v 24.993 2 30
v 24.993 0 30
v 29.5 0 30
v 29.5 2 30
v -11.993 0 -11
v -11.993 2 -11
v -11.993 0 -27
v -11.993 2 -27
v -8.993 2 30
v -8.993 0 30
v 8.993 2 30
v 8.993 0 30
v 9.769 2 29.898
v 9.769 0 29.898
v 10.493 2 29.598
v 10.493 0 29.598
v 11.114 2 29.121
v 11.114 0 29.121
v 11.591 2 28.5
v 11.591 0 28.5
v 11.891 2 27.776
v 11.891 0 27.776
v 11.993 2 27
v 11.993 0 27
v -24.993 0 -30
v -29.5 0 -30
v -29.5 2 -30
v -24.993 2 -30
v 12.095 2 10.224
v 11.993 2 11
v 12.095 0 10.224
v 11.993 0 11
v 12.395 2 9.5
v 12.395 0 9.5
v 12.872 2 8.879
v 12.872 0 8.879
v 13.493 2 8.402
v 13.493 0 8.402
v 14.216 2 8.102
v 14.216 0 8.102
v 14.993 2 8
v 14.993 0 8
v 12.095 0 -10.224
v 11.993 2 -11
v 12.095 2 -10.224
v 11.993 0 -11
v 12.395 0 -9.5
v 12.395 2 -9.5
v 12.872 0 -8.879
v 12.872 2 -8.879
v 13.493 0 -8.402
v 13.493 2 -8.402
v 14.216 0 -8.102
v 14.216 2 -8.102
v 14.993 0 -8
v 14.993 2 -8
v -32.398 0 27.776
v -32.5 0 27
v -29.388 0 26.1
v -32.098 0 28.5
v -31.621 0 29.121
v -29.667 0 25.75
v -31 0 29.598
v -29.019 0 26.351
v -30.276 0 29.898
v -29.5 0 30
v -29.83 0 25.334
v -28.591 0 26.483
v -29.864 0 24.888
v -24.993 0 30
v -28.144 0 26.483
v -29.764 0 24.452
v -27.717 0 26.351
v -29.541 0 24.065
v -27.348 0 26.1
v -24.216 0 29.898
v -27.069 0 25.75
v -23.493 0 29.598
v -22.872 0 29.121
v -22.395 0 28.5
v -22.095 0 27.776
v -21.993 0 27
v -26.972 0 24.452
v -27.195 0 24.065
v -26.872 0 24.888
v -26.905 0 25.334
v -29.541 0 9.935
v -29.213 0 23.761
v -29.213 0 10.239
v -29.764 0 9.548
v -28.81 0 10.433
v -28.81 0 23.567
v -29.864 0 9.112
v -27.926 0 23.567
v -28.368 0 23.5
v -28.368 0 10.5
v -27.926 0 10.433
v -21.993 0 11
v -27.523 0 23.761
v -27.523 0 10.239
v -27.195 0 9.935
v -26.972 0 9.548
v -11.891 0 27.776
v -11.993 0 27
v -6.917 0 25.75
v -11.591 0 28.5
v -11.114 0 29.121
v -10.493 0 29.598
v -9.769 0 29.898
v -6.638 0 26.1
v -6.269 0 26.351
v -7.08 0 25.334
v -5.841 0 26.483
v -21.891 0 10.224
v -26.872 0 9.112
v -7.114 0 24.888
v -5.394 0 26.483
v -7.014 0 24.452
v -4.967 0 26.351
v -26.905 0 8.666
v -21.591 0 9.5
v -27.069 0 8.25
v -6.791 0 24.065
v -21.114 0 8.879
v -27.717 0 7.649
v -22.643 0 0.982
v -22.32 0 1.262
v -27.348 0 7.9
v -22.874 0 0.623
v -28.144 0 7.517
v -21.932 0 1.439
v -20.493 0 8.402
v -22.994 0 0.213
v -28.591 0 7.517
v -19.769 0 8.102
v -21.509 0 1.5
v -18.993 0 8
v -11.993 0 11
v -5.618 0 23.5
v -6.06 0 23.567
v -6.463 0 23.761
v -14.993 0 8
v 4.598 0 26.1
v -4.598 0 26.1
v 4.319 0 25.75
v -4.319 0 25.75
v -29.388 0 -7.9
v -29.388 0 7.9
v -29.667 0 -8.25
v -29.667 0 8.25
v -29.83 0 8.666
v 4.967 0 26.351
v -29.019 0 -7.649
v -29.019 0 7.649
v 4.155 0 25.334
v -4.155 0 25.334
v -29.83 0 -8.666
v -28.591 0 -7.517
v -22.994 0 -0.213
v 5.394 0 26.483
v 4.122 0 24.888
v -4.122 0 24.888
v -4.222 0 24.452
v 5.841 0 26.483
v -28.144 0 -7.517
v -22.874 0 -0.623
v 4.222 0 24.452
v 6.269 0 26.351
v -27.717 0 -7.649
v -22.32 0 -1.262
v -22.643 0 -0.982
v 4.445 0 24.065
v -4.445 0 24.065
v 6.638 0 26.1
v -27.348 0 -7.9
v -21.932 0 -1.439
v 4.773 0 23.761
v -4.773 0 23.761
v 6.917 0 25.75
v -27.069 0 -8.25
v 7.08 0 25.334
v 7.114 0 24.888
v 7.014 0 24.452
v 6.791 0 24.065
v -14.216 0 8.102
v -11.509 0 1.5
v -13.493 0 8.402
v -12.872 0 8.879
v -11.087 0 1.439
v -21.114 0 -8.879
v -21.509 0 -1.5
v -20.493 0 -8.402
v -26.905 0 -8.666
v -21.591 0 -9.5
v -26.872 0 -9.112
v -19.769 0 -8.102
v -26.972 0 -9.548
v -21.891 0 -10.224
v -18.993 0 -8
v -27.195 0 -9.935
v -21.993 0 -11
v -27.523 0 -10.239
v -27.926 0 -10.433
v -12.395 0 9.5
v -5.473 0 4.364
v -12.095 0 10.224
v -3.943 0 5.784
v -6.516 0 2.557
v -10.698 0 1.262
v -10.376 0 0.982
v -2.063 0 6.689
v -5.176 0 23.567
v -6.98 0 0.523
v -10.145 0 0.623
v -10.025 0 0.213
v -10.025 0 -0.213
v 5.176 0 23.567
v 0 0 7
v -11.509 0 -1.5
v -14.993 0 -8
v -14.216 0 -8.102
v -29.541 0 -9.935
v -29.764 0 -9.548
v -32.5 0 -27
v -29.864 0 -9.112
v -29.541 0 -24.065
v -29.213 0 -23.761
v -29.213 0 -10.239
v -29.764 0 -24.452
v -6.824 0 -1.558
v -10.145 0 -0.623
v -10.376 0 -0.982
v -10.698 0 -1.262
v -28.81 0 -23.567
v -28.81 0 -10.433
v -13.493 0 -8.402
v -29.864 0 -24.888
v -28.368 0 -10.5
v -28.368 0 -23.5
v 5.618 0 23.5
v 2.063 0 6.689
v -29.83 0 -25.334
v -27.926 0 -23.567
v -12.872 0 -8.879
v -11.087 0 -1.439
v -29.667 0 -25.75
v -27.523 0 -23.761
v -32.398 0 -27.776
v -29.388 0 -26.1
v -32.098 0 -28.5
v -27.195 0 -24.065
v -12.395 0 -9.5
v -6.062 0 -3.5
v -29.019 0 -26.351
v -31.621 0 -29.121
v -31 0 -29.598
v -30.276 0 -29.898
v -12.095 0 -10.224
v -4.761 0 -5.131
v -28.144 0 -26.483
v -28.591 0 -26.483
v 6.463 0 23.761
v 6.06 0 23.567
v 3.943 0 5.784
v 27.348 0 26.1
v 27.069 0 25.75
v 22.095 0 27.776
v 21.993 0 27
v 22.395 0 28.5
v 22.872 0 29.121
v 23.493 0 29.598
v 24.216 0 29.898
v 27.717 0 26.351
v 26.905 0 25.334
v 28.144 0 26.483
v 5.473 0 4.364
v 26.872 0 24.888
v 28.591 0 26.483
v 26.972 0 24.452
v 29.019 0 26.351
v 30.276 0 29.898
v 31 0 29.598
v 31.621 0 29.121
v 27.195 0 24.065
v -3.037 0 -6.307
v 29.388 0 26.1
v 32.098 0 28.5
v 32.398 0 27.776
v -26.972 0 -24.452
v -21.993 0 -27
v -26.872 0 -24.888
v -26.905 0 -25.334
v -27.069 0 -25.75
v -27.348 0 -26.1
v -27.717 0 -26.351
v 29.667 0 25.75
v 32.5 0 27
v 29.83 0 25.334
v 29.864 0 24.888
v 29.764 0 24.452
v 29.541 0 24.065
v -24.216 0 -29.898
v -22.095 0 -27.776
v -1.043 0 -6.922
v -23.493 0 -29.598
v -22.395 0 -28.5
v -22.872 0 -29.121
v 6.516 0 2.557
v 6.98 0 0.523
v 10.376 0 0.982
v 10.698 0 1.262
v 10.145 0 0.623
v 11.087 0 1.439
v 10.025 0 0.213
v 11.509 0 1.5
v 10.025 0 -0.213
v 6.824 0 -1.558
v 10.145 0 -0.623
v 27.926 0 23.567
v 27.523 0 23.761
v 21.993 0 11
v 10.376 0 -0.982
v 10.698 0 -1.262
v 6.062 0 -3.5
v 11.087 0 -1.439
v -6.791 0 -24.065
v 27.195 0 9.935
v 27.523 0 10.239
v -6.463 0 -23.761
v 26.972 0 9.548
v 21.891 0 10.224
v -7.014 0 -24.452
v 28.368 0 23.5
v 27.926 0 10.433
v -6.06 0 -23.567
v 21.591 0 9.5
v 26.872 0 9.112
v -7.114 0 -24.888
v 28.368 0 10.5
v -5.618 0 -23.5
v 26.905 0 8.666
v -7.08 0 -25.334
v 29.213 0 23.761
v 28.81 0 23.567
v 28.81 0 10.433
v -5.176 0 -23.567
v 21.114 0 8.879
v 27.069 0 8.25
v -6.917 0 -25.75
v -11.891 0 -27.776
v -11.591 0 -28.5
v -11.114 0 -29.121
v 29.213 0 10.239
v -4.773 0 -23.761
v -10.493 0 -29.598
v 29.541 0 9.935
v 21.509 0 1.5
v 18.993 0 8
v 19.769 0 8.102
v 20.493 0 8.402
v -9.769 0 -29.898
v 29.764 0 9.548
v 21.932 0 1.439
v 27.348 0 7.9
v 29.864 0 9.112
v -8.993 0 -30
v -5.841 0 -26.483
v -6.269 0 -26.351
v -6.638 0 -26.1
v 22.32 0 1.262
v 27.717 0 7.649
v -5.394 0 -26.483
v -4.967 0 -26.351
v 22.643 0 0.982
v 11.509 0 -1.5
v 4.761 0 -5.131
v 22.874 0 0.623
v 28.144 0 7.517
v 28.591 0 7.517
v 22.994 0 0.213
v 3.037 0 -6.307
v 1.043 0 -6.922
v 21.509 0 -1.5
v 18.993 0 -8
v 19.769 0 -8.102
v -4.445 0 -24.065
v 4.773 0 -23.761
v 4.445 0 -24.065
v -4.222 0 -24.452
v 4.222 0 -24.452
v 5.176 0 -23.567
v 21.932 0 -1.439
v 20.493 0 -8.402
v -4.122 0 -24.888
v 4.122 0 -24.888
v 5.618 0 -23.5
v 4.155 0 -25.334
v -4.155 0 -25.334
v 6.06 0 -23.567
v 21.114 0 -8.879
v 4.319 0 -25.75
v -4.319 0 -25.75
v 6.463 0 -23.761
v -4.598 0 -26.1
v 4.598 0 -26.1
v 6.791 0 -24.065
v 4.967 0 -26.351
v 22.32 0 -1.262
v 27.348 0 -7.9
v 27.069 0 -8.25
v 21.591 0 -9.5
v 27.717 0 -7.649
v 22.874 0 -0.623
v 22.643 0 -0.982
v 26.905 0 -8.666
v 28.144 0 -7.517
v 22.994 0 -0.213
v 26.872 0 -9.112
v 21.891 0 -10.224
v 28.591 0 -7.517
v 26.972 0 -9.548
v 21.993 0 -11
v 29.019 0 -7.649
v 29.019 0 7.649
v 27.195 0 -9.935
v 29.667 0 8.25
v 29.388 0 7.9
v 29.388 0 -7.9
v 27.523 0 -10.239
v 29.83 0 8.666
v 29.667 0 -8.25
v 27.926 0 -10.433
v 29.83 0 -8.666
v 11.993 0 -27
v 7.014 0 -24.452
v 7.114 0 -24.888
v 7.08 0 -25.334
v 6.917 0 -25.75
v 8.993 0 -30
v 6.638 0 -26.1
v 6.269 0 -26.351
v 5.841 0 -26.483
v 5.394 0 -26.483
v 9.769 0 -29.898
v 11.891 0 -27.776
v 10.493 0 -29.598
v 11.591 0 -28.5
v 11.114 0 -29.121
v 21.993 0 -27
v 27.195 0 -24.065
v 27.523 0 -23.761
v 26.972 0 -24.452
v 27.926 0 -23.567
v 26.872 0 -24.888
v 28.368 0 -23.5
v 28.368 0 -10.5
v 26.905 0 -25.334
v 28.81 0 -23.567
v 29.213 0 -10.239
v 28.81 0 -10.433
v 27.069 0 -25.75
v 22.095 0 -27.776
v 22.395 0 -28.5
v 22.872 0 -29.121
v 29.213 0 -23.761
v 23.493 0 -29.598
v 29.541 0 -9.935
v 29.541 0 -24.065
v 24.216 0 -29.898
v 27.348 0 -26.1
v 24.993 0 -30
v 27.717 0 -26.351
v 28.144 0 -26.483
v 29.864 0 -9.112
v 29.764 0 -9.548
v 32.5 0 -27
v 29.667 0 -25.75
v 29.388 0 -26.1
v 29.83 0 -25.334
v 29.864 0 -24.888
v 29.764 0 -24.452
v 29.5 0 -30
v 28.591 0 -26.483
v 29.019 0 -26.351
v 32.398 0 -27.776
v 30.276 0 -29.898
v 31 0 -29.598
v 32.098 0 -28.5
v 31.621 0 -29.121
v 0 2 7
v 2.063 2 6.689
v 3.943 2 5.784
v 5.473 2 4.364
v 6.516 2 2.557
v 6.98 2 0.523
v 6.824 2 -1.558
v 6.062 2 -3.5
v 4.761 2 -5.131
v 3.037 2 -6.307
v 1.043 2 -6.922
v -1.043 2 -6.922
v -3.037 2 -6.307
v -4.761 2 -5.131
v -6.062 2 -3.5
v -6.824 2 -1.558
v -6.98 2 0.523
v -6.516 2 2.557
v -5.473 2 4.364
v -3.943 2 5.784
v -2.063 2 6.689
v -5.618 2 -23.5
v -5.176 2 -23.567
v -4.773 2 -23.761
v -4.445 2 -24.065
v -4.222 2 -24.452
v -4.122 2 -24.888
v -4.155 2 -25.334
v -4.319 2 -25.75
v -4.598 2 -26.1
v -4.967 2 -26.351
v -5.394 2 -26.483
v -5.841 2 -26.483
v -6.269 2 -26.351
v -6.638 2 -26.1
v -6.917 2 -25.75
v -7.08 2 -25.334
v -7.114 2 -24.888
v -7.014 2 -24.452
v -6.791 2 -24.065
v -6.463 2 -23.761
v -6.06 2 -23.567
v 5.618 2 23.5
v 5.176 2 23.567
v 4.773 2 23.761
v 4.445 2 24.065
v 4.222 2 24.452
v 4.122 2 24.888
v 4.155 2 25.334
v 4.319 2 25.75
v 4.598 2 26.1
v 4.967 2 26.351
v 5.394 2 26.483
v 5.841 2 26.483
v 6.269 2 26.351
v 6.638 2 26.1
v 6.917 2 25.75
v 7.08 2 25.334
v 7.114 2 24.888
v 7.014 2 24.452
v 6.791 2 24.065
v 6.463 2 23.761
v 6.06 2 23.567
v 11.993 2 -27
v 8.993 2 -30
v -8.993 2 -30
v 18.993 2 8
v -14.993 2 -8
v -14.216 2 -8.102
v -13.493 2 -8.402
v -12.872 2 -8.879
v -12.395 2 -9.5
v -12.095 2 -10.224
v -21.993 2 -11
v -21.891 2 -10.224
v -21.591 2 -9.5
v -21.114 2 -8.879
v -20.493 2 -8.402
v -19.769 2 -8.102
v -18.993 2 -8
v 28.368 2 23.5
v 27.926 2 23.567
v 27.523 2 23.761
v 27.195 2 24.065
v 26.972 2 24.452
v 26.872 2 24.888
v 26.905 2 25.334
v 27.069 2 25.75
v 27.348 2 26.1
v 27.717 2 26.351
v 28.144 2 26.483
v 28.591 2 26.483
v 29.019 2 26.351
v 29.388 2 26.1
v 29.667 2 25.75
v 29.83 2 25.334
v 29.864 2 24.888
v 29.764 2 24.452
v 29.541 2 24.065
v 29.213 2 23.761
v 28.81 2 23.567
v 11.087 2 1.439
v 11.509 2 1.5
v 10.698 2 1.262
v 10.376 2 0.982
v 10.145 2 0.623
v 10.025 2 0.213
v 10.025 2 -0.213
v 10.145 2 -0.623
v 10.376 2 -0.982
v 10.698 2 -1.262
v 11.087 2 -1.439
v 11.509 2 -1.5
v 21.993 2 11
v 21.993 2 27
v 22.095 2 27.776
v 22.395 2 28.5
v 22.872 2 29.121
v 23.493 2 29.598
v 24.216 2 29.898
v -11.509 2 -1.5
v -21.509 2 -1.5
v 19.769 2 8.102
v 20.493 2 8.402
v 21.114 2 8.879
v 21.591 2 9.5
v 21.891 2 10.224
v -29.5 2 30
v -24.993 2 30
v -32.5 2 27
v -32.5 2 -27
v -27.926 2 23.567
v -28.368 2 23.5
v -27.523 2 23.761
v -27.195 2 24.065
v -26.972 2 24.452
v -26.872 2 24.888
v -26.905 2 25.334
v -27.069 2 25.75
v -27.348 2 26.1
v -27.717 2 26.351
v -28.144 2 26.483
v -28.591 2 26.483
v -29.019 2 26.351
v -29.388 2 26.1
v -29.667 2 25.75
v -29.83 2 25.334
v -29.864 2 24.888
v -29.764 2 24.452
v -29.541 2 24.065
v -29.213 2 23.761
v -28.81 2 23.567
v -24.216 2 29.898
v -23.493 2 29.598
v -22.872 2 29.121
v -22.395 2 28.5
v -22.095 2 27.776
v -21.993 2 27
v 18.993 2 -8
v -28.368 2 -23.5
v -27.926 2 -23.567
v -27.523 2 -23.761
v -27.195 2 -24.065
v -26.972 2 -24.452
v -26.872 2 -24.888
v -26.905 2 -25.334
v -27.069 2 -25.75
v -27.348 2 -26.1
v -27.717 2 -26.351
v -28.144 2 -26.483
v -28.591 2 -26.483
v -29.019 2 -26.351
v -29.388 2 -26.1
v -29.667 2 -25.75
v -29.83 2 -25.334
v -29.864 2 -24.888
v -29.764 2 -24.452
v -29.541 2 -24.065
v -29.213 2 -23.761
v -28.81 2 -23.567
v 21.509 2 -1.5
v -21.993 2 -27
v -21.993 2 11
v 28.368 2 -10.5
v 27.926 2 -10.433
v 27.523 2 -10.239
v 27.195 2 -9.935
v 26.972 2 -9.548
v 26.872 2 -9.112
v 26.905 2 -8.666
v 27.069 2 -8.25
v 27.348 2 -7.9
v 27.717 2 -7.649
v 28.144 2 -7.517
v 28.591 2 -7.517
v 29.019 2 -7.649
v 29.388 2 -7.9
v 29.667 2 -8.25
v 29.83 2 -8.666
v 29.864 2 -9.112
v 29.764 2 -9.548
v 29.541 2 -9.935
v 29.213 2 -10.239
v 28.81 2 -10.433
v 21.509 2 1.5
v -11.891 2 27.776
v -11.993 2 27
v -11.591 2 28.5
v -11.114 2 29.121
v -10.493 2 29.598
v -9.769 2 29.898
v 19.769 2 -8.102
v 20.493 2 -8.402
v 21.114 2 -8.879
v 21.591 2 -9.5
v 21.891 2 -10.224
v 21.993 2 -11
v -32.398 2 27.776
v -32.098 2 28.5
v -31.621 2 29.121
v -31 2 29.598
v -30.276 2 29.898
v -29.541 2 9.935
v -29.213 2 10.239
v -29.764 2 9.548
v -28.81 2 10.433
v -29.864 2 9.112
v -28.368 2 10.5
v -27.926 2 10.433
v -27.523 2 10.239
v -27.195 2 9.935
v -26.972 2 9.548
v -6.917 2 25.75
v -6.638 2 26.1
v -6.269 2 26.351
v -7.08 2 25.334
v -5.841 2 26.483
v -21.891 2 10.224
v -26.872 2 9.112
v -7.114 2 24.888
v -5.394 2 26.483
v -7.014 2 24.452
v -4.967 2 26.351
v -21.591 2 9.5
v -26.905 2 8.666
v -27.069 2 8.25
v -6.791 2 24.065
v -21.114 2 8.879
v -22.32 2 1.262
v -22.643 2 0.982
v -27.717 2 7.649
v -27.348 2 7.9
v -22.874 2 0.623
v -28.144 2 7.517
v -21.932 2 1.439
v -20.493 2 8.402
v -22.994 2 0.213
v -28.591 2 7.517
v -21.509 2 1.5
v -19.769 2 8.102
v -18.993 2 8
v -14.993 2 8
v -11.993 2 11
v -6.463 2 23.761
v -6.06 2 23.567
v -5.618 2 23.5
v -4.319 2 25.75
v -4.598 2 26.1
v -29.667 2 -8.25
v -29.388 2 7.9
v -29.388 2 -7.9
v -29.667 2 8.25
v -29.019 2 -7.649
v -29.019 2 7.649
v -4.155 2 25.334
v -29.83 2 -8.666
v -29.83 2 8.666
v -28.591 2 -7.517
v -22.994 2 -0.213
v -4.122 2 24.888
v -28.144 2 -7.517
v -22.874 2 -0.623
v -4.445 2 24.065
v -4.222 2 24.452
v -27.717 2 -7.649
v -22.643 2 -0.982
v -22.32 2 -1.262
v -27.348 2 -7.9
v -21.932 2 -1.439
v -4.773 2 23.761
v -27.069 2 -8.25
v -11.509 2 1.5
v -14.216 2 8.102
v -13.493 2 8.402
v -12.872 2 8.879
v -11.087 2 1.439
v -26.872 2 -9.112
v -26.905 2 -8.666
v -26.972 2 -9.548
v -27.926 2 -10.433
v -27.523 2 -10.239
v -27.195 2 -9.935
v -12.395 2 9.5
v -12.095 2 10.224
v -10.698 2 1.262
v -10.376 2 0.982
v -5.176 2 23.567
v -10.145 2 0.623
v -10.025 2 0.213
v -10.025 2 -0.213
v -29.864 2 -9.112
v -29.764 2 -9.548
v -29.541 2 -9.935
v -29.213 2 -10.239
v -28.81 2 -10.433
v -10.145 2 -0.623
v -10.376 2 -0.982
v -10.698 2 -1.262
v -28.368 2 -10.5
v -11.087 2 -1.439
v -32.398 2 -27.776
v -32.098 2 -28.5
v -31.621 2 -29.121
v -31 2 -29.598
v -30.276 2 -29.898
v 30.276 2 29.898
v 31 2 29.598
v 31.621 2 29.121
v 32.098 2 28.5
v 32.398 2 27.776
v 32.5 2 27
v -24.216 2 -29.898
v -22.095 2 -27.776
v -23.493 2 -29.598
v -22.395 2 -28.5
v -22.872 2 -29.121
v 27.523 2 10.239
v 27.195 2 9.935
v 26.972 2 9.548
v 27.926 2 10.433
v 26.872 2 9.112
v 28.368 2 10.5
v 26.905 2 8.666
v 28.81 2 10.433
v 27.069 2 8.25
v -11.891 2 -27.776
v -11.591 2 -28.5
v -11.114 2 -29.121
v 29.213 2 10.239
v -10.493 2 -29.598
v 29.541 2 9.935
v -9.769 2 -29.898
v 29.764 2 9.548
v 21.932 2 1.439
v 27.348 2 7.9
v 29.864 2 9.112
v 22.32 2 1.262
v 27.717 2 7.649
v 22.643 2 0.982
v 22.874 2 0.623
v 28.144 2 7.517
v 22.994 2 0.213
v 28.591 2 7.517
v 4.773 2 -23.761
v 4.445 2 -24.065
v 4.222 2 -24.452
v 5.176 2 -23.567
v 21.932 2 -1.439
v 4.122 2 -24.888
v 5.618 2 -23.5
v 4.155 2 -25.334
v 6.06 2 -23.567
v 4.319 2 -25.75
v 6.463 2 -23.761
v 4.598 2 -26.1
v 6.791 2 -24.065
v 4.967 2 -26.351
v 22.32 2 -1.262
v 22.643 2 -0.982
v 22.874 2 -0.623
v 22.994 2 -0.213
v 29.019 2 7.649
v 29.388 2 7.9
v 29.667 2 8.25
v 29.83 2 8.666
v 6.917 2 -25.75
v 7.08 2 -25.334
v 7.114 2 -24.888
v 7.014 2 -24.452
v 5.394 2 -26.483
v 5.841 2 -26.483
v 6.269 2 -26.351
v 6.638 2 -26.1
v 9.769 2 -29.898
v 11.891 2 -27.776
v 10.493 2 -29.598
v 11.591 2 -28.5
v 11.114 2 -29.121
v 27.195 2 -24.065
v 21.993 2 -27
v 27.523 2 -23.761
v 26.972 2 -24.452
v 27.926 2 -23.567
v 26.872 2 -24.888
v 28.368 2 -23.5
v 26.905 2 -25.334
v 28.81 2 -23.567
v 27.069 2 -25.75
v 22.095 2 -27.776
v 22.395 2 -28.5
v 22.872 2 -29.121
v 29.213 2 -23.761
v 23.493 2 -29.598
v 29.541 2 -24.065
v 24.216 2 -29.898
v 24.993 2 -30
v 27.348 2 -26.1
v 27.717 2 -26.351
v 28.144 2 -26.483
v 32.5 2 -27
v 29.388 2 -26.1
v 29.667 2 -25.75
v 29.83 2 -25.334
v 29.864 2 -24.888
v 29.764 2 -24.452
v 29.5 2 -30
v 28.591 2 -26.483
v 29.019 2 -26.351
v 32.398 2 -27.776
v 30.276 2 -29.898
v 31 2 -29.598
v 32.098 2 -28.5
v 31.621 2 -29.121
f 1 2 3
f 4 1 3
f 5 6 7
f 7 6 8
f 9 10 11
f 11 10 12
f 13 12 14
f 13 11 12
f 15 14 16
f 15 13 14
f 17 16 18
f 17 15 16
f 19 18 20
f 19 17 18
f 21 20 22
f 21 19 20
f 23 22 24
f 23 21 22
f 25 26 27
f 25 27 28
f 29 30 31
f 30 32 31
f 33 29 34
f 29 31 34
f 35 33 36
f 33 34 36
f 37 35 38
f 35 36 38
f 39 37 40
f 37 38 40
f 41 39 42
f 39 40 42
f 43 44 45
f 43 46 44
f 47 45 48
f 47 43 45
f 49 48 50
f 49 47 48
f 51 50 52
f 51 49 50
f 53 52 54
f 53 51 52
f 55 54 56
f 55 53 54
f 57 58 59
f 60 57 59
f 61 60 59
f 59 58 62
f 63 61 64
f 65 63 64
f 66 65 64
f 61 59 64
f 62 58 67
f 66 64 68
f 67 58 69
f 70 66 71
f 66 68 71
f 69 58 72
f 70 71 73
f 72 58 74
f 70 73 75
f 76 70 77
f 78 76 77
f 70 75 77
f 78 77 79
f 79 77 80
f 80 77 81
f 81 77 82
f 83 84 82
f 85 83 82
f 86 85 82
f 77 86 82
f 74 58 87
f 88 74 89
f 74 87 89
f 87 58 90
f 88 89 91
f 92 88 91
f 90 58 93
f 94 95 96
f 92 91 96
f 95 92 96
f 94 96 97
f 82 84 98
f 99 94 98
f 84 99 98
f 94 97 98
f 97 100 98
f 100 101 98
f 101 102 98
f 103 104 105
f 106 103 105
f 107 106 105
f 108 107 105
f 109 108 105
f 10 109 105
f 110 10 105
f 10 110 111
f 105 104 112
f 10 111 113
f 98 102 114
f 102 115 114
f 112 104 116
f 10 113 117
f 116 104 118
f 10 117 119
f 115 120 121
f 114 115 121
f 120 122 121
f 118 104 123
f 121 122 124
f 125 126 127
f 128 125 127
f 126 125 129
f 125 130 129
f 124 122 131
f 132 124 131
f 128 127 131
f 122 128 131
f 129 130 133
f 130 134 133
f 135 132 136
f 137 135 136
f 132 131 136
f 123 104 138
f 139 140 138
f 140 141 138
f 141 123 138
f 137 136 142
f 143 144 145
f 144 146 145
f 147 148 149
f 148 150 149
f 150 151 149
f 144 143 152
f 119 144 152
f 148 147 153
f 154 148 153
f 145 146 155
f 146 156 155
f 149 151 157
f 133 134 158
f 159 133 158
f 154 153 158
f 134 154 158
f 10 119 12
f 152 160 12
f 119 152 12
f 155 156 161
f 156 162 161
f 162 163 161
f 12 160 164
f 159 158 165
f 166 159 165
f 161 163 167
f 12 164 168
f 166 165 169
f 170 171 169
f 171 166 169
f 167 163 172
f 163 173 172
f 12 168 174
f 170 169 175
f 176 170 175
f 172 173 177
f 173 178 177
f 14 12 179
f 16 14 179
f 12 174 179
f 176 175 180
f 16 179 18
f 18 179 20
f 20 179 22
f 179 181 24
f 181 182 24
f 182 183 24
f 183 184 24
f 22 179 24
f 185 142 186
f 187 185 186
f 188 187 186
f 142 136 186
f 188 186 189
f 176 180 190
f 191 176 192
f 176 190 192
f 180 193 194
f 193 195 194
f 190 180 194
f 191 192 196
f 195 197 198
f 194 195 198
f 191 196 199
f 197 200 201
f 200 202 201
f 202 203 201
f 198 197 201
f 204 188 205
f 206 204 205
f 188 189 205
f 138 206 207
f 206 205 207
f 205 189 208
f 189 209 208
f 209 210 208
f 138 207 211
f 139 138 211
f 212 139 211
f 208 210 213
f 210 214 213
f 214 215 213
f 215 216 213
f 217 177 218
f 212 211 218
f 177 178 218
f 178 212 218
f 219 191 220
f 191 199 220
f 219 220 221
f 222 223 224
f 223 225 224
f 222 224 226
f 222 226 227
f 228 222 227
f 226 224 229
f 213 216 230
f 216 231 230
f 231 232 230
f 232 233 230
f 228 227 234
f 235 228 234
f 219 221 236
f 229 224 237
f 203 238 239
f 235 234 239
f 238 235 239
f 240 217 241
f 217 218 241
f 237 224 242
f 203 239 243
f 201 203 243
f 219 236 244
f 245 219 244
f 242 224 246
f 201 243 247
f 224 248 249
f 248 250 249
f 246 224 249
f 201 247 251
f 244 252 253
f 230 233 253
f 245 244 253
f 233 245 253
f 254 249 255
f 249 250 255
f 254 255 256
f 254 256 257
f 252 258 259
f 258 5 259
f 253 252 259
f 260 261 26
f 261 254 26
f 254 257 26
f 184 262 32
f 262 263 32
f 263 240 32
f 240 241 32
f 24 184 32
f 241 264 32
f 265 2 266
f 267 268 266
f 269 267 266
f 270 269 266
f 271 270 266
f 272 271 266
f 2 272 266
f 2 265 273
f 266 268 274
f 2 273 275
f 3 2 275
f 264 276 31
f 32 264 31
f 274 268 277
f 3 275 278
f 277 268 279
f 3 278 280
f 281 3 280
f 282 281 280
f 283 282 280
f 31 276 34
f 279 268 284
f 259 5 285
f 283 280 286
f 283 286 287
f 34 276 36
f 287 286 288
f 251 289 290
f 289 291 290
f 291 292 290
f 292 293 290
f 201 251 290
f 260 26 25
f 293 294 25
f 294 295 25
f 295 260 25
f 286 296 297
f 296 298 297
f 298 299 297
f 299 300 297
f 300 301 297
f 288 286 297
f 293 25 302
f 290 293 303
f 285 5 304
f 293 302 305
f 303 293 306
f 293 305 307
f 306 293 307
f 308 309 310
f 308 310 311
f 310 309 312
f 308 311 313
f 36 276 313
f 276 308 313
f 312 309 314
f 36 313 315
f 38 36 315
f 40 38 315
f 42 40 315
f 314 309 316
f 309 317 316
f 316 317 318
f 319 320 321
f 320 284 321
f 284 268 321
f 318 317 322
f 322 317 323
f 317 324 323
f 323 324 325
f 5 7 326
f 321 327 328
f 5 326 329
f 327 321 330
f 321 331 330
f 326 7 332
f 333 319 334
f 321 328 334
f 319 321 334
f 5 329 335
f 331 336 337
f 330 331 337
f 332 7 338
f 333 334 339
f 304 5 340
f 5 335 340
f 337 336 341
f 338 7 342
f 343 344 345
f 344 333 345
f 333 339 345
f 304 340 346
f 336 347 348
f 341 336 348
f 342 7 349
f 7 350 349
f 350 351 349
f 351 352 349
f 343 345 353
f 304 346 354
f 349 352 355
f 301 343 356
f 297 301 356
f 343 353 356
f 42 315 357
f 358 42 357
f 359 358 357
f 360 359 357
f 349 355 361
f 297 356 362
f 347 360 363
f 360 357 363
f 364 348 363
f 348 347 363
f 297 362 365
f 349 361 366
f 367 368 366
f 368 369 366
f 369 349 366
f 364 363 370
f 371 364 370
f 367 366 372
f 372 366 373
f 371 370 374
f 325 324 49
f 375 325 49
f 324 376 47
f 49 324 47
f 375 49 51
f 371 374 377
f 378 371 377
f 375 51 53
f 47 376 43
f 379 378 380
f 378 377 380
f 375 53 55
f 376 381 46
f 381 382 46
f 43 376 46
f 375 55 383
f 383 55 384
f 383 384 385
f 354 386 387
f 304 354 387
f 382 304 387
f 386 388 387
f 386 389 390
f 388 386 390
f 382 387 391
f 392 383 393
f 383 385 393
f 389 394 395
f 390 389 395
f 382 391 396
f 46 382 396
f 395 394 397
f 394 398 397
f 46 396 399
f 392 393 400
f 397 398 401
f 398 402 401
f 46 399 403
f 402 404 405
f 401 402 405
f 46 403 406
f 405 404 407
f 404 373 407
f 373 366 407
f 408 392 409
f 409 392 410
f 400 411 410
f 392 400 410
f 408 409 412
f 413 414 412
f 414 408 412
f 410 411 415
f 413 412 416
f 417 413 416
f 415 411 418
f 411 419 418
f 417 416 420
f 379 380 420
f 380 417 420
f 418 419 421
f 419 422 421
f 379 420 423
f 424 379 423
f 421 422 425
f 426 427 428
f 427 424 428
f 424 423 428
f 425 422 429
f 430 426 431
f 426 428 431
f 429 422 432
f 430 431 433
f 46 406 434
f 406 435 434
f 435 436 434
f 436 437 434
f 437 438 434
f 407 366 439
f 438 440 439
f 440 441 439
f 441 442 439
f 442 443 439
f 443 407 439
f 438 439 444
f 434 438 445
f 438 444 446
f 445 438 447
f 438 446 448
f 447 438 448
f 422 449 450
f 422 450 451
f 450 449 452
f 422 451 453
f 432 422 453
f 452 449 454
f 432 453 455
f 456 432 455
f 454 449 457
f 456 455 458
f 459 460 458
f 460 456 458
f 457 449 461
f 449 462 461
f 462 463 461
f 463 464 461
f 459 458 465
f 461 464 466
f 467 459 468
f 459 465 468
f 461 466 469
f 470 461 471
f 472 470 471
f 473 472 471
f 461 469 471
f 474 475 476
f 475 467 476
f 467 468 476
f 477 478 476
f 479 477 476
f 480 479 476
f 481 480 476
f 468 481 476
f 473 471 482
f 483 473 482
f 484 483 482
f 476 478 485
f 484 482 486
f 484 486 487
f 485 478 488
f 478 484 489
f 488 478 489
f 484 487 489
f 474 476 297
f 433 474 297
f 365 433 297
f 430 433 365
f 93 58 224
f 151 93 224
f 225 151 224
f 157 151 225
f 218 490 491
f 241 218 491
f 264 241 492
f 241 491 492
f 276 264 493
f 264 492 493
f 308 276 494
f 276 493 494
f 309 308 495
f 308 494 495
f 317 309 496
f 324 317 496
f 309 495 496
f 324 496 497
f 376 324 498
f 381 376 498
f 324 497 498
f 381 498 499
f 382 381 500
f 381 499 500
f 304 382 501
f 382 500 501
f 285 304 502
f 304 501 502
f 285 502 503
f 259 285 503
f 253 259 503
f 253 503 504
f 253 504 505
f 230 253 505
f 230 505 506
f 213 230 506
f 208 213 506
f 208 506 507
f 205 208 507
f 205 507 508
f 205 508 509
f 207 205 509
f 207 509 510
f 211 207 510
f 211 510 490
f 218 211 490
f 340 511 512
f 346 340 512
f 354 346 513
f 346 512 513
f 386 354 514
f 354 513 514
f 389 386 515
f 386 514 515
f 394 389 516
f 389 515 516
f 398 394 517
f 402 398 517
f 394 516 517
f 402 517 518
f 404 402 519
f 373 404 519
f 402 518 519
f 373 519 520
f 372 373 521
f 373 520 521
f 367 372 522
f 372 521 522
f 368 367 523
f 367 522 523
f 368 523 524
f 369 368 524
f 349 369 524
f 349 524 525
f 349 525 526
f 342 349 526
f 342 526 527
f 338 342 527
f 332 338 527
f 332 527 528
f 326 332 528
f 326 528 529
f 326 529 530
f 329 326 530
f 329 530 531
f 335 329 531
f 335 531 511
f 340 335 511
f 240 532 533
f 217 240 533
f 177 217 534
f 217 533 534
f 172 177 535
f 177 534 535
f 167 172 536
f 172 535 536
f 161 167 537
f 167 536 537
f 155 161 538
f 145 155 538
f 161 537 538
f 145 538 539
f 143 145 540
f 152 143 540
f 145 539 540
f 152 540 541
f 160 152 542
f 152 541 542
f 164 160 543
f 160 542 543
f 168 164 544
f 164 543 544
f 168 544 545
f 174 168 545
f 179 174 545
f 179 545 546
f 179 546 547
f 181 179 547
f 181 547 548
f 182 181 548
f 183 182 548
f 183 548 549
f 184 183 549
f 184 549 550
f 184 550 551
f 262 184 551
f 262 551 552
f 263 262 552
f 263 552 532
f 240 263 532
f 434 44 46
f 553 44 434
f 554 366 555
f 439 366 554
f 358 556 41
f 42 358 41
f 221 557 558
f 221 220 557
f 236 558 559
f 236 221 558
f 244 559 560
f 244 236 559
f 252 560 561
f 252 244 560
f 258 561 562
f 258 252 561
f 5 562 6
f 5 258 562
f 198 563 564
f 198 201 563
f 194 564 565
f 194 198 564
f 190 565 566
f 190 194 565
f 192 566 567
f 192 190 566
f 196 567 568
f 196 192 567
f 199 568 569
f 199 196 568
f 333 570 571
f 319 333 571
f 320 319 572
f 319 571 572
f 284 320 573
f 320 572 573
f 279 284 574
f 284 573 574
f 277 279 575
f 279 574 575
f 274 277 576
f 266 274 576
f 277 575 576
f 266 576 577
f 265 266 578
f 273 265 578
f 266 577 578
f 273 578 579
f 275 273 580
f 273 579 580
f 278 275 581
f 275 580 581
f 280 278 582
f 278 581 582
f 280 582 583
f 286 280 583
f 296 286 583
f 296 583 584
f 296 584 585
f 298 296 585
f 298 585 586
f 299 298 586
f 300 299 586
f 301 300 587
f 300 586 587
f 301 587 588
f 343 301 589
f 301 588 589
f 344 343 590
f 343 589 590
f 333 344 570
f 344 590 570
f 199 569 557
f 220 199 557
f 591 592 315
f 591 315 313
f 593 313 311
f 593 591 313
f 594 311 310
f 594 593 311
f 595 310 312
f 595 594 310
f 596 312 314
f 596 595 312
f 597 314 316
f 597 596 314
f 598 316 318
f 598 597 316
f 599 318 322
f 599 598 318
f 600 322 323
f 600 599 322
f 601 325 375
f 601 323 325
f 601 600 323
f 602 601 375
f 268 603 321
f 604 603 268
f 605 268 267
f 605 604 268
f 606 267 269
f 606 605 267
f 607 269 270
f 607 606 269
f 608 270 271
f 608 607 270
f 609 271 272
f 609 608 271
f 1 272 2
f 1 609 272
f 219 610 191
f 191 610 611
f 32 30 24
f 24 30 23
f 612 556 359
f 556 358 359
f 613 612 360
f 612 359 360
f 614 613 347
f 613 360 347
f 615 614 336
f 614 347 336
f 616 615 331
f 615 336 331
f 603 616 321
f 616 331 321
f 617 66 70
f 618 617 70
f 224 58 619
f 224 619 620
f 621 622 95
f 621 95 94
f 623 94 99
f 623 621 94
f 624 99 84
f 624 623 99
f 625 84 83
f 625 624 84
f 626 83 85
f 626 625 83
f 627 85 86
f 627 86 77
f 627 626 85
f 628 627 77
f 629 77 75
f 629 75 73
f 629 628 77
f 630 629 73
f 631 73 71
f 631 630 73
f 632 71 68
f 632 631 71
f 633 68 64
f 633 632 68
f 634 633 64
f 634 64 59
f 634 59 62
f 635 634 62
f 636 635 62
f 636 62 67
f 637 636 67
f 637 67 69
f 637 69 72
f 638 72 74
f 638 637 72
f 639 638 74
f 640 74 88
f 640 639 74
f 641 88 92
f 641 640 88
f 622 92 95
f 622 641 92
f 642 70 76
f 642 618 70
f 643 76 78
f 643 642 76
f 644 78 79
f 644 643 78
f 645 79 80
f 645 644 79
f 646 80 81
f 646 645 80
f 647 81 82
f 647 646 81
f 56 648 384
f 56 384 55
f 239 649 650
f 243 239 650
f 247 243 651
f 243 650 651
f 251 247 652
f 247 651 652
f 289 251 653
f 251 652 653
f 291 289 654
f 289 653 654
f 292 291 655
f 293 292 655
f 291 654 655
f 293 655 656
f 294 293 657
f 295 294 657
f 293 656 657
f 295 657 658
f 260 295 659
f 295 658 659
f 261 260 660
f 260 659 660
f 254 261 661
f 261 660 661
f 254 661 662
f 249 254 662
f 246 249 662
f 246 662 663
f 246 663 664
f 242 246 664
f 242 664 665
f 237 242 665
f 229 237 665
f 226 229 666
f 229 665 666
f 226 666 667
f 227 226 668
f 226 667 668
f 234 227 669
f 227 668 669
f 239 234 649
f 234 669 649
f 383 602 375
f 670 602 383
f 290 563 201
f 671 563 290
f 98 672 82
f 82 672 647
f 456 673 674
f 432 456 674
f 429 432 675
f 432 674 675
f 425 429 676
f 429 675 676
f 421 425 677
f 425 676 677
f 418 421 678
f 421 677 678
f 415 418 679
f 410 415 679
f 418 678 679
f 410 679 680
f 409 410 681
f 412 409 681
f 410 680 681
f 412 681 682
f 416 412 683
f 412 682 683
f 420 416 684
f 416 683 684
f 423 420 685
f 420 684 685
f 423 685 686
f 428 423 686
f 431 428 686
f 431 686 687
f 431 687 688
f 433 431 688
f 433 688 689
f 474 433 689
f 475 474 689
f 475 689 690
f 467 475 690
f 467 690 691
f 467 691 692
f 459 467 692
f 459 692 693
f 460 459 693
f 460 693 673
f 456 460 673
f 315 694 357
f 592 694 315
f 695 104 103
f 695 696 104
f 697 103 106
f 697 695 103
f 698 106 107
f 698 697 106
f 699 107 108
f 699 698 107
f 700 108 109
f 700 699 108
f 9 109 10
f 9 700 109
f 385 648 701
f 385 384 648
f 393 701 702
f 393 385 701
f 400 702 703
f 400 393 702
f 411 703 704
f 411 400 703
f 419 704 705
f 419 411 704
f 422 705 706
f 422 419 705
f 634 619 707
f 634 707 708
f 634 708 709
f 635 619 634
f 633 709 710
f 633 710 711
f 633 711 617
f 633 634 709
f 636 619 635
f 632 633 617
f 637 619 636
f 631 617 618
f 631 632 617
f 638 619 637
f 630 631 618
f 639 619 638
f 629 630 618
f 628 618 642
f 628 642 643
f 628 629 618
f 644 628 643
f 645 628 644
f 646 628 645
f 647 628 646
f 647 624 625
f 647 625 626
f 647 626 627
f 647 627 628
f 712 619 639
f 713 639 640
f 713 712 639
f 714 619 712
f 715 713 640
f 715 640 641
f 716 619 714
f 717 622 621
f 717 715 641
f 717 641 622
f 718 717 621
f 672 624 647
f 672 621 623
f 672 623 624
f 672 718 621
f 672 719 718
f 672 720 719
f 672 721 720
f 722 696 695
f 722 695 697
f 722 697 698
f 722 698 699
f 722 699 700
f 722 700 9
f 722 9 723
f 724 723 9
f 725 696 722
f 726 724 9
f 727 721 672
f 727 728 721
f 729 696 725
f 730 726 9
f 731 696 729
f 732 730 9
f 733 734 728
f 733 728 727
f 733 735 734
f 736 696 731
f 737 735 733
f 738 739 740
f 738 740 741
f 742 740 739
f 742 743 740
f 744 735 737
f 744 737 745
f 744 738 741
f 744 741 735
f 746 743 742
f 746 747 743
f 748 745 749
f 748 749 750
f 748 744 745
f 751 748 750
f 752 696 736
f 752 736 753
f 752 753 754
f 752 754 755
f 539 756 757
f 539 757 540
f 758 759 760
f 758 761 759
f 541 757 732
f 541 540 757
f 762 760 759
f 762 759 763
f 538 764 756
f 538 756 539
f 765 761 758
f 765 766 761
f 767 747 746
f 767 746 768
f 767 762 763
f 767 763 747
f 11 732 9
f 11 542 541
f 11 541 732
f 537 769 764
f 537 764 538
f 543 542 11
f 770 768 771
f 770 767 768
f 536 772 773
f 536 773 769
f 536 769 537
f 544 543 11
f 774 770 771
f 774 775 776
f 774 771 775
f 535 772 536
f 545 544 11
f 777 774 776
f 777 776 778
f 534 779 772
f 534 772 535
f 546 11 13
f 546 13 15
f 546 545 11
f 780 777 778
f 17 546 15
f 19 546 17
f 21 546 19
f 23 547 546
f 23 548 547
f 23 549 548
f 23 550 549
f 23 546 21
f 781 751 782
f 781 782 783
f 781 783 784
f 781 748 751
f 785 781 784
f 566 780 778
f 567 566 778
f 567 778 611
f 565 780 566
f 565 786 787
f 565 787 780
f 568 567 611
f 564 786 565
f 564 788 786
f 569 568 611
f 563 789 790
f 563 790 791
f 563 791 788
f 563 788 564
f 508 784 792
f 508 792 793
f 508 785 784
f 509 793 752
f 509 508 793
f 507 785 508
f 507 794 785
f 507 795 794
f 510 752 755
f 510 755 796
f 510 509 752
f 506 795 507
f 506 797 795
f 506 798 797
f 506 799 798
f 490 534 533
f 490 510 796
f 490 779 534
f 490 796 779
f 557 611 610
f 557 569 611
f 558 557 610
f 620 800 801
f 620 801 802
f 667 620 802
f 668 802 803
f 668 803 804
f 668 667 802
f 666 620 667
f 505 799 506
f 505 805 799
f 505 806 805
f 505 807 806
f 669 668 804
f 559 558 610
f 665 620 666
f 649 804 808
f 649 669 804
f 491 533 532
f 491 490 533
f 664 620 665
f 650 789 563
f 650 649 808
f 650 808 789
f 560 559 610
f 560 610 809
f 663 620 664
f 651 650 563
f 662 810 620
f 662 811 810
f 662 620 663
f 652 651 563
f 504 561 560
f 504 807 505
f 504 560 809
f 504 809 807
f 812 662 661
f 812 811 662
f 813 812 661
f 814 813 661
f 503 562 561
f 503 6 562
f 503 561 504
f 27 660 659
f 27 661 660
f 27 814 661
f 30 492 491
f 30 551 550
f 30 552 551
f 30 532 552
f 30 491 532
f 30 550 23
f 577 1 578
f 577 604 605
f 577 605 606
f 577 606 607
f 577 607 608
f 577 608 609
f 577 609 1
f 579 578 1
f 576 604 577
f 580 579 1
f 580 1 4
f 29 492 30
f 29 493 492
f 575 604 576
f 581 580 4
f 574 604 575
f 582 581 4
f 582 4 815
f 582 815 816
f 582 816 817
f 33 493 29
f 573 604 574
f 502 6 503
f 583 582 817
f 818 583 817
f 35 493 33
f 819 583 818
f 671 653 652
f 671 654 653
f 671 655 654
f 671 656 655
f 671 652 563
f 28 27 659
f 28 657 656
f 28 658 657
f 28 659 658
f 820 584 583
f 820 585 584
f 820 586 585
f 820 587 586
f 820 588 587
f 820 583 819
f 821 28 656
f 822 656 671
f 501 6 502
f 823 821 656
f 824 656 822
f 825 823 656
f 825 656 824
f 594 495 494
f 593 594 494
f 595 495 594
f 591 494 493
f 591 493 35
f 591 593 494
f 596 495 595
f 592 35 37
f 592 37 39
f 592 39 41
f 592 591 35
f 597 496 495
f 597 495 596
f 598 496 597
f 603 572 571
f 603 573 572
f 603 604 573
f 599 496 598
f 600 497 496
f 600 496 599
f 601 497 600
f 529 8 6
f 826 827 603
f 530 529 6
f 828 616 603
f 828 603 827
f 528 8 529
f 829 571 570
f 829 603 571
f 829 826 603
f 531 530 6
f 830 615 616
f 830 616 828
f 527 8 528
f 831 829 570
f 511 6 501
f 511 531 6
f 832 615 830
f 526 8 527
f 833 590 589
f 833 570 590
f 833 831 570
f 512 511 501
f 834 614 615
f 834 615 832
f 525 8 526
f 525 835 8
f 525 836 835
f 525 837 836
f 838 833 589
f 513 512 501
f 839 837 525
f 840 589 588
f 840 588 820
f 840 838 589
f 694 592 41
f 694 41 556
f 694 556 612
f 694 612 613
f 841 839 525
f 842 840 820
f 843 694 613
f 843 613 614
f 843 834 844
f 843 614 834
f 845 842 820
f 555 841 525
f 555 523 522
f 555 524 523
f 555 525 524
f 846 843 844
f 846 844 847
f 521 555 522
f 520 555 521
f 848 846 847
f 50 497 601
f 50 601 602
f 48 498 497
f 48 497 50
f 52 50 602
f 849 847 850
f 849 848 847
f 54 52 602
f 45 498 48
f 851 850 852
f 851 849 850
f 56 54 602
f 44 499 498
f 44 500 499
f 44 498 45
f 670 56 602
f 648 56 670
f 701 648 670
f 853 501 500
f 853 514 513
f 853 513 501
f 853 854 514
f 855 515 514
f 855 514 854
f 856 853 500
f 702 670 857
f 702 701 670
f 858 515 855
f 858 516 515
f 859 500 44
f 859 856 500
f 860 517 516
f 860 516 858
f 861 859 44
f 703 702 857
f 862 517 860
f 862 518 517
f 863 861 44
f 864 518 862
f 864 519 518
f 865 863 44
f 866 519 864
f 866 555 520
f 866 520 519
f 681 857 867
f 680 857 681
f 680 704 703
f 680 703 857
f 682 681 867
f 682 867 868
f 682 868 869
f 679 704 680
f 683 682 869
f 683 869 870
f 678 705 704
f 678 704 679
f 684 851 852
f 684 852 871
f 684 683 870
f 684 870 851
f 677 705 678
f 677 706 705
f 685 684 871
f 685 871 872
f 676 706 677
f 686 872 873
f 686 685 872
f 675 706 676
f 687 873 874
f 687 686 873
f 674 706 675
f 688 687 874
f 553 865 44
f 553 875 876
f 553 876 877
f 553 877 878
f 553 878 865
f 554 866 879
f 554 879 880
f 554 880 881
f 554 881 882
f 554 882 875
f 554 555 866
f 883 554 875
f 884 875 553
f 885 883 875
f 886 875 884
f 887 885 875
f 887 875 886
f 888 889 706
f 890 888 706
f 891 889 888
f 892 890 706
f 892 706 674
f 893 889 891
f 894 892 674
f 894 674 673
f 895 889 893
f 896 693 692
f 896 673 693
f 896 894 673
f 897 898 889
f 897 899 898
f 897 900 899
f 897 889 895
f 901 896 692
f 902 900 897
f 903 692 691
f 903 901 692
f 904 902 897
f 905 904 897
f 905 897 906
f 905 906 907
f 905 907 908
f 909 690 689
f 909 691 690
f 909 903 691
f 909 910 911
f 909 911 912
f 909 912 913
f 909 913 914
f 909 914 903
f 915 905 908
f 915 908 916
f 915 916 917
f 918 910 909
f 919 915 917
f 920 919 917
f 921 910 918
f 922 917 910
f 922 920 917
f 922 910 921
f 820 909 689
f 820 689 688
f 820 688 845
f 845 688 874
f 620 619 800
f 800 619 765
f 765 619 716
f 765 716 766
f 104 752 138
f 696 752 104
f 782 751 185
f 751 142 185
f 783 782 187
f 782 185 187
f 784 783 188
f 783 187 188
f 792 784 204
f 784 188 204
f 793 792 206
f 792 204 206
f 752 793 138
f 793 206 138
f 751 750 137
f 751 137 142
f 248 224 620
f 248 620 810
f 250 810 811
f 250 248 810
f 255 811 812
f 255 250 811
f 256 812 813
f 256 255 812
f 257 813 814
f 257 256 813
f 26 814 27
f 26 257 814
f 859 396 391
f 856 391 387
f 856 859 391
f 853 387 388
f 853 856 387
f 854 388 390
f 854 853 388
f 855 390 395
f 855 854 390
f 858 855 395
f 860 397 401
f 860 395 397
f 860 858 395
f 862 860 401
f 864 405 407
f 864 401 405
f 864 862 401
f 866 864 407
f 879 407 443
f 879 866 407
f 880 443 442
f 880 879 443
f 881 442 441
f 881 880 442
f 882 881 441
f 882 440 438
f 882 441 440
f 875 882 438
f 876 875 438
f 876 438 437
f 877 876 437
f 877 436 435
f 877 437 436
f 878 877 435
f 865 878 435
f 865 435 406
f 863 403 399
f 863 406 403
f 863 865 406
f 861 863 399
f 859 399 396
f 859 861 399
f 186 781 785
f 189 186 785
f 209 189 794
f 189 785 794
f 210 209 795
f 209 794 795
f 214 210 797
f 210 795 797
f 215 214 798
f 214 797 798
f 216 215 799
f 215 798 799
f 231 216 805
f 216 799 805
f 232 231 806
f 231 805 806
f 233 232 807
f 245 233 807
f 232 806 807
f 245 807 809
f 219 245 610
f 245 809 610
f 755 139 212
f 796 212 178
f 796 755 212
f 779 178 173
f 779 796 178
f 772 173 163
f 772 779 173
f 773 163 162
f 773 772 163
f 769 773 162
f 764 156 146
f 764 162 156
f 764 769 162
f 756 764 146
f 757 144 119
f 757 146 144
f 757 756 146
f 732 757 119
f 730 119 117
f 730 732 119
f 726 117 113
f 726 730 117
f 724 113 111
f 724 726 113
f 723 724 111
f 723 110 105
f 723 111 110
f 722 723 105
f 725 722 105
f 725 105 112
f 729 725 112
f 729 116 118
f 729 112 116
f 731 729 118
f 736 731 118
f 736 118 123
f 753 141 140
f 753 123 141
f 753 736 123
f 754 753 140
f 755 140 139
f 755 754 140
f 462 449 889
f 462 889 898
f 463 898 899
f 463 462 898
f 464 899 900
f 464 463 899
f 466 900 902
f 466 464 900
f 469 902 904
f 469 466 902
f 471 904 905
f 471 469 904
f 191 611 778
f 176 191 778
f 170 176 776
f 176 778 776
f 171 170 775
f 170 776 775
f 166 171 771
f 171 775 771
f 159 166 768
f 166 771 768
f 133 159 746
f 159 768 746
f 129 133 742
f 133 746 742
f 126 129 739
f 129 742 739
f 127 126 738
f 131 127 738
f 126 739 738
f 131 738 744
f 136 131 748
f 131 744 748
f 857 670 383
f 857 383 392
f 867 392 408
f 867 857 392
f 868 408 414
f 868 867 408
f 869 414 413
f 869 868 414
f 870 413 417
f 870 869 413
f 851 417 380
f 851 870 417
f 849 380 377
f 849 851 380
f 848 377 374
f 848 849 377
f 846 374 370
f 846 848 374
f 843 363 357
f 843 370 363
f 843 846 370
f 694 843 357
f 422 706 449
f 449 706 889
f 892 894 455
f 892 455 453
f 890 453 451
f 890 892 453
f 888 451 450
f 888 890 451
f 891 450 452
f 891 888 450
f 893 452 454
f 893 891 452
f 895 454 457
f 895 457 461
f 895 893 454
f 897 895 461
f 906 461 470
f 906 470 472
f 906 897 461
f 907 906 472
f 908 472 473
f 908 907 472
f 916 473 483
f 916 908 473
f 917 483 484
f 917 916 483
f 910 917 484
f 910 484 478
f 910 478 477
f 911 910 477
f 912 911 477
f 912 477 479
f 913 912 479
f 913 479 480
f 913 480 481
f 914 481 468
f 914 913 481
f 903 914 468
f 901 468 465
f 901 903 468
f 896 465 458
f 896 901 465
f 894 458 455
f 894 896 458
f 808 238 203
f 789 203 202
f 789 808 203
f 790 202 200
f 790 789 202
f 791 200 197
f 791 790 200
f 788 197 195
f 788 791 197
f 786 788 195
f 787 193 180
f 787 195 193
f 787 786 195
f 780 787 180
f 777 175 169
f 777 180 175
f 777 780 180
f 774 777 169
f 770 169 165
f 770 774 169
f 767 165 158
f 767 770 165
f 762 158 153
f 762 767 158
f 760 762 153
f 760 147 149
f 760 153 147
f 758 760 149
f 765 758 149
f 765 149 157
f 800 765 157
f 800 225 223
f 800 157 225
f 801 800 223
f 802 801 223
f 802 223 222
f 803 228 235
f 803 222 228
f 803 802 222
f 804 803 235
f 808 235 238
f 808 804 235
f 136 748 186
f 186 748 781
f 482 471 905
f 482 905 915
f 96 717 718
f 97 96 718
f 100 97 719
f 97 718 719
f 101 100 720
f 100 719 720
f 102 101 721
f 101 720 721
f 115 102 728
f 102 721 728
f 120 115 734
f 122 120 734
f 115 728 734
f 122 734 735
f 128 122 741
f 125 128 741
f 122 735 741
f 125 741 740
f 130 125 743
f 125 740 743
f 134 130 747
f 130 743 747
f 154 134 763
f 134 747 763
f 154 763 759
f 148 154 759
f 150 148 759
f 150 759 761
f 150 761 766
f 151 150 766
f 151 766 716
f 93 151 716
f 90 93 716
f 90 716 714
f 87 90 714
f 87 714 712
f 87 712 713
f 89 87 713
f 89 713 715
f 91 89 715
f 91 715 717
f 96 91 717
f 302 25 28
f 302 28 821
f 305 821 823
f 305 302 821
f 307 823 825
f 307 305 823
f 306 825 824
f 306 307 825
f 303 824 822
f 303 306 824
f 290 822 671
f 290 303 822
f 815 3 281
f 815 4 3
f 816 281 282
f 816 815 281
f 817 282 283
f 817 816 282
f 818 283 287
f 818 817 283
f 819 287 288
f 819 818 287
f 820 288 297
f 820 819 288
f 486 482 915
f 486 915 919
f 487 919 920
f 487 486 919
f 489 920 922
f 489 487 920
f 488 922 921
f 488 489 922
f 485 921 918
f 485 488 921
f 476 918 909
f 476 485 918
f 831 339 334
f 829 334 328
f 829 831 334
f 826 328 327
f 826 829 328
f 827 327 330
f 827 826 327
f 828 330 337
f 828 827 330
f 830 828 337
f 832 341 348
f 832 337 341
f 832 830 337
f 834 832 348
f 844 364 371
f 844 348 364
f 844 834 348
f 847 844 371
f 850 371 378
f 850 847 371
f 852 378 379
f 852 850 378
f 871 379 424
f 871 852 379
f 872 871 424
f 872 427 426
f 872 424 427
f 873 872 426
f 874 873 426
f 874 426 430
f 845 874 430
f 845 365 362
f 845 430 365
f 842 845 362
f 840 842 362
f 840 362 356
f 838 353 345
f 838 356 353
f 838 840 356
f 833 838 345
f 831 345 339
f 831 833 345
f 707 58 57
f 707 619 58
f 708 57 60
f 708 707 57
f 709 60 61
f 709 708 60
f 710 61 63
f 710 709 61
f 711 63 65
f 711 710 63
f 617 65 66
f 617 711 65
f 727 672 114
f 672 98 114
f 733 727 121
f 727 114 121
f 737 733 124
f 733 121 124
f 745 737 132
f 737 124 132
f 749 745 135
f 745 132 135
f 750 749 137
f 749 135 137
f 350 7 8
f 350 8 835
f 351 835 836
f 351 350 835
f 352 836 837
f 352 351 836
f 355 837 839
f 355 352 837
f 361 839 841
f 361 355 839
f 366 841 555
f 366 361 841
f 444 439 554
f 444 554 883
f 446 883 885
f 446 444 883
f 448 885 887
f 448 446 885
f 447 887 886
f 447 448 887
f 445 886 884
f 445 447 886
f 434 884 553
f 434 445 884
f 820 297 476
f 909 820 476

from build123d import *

# Parameters (mm, degrees)
SKETCH_1_W               = 65
SKETCH_1_H               = 60
EXTRUDE_1_DEPTH          = 2
SKETCH_2_R               = 1.5
CUT_EXTRUDE_1_DEPTH      = 2
SKETCH_3_R               = 1.5
CUT_EXTRUDE_2_DEPTH      = 45.274710615
MIRROR_2_COPY_1_SKETCH_R = 1.5
MIRROR_2_COPY_1_DEPTH    = 2
MIRROR_2_COPY_2_SKETCH_R = 1.5
MIRROR_2_COPY_2_DEPTH    = 45.274710615
SKETCH_4_W               = 10
SKETCH_4_H               = 34
CUT_EXTRUDE_3_DEPTH      = 45.274710615
MIRROR_4_COPY_1_SKETCH_W = 10
MIRROR_4_COPY_1_SKETCH_H = 34
MIRROR_4_COPY_1_DEPTH    = 45.274710615
SKETCH_5_R               = 7
CUT_EXTRUDE_4_DEPTH      = 45.274710615
FILLET_1_R               = 3
MIRROR_6_DEPTH           = 2
SKETCH_6_R               = 1.5
CUT_EXTRUDE_5_DEPTH      = 45.274710615
CUT_EXTRUDE_6_DEPTH      = 45.274710615
MIRROR_8_COPY_1_SKETCH_R = 1.5
MIRROR_8_COPY_1_DEPTH    = 45.274710615
FILLET_2_R               = 3


# Read off the part's stored shape, not the designer's step: 镜向6
with BuildPart() as part:
    # 草图1 → 凸台-拉伸1 (new body)
    with BuildSketch(Plane(origin=(0, 0, 0), x_dir=(1, 0, 0), z_dir=(0, 1, 0))):
        Rectangle(SKETCH_1_W, SKETCH_1_H)
    extrude(amount=EXTRUDE_1_DEPTH)

    # 草图2 → 切除-拉伸1 (cut)
    with BuildSketch(Plane(origin=(0, 2, 0), x_dir=(1, 0, 0), z_dir=(0, 1, 0))):
        with Locations(Location((-28.367832783, 25, 0), (0, 0, 270))):
            Circle(SKETCH_2_R)
    cut_extrude_1 = extrude(amount=-CUT_EXTRUDE_1_DEPTH, mode=Mode.SUBTRACT)

    # 草图3 → 切除-拉伸2 (cut, through all)
    with BuildSketch(Plane(origin=(0, 2, 0), x_dir=(1, 0, 0), z_dir=(0, 1, 0))):
        with Locations(Location((-5.617832783, 25, 0), (0, 0, 270))):
            Circle(SKETCH_3_R)
    cut_extrude_2 = extrude(amount=-CUT_EXTRUDE_2_DEPTH, mode=Mode.SUBTRACT)

    # 镜向1: 切除-拉伸1, 切除-拉伸2 across plane
    add(cut_extrude_1.mirror(Plane(origin=(0, 0, 0), x_dir=(0, 0, 1), z_dir=(1, 0, 0))), mode=Mode.SUBTRACT)
    add(cut_extrude_2.mirror(Plane(origin=(0, 0, 0), x_dir=(0, 0, 1), z_dir=(1, 0, 0))), mode=Mode.SUBTRACT)

    # 镜向2: 切除-拉伸1, 切除-拉伸2 across plane
    add(cut_extrude_1.mirror(Plane.XY), mode=Mode.SUBTRACT)
    add(cut_extrude_2.mirror(Plane.XY), mode=Mode.SUBTRACT)

    # 镜向2 copy 1 sketch → 镜向2 copy 1 (cut)
    with BuildSketch(Plane(origin=(0, 2, 0), x_dir=(-1, 0, 0), z_dir=(0, 1, 0))):
        with Locations(Location((-28.367832783, 25, 0), (0, 0, 270))):
            Circle(MIRROR_2_COPY_1_SKETCH_R)
    extrude(amount=-MIRROR_2_COPY_1_DEPTH, mode=Mode.SUBTRACT)

    # 镜向2 copy 2 sketch → 镜向2 copy 2 (cut, through all)
    with BuildSketch(Plane(origin=(0, 2, 0), x_dir=(-1, 0, 0), z_dir=(0, 1, 0))):
        with Locations(Location((-5.617832783, 25, 0), (0, 0, 270))):
            Circle(MIRROR_2_COPY_2_SKETCH_R)
    extrude(amount=-MIRROR_2_COPY_2_DEPTH, mode=Mode.SUBTRACT)

    # 草图4 → 切除-拉伸3 (cut, through all)
    with BuildSketch(Plane(origin=(0, 2, 0), x_dir=(1, 0, 0), z_dir=(0, 1, 0))):
        with Locations((-16.992832783, 25)):
            Rectangle(SKETCH_4_W, SKETCH_4_H)
    cut_extrude_3 = extrude(amount=-CUT_EXTRUDE_3_DEPTH, mode=Mode.SUBTRACT)

    # 镜向3: 切除-拉伸3 across plane
    add(cut_extrude_3.mirror(Plane.XY), mode=Mode.SUBTRACT)

    # 镜向4: 切除-拉伸3 across plane
    add(cut_extrude_3.mirror(Plane(origin=(0, 0, 0), x_dir=(0, 0, 1), z_dir=(1, 0, 0))), mode=Mode.SUBTRACT)

    # 镜向4 copy 1 sketch → 镜向4 copy 1 (cut, through all)
    with BuildSketch(Plane(origin=(0, 2, 0), x_dir=(-1, 0, 0), z_dir=(0, 1, 0))):
        with Locations((-16.992832783, 25)):
            Rectangle(MIRROR_4_COPY_1_SKETCH_W, MIRROR_4_COPY_1_SKETCH_H)
    extrude(amount=-MIRROR_4_COPY_1_DEPTH, mode=Mode.SUBTRACT)

    # 草图5 → 切除-拉伸4 (cut, through all)
    with BuildSketch(Plane(origin=(0, 2, 0), x_dir=(1, 0, 0), z_dir=(0, 1, 0))):
        with Locations(Location((0, 0, 0), (0, 0, 270))):
            Circle(SKETCH_5_R)
    extrude(amount=-CUT_EXTRUDE_4_DEPTH, mode=Mode.SUBTRACT)

    # 圆角1
    fillet_1_edges = [part.edges().sort_by_distance(p)[0] for p in [
        (-21.992832783, 1, 30),
        (-11.992832783, 1, 30),
        (32.5, 1, 30),
        (-32.5, 1, 30),
        (21.992832783, 1, 30),
        (11.992832783, 1, 30),
    ]]
    fillet(fillet_1_edges, radius=FILLET_1_R)

    # 镜向6 outline → 镜向6 (cut)
    with BuildSketch(Plane(origin=(0, 0, 0), x_dir=(1, 0, 0), z_dir=(0, 1, 0))):
        with BuildLine():
            Line((-11.992832783, 30), (-11.992832783, 27))
            ThreePointArc((-11.992832783, 27), (-11.114153127, 29.121320343), (-8.992832783, 30))
            Line((-8.992832783, 30), (-11.992832783, 30))
        make_face()
        with BuildLine():
            Line((11.992832783, 30), (8.992832783, 30))
            ThreePointArc((8.992832783, 30), (11.114153127, 29.121320343), (11.992832783, 27))
            Line((11.992832783, 27), (11.992832783, 30))
        make_face()
        with BuildLine():
            Line((32.5, 30), (29.5, 30))
            ThreePointArc((29.5, 30), (31.621320344, 29.121320344), (32.5, 27))
            Line((32.5, 27), (32.5, 30))
        make_face()
        with BuildLine():
            ThreePointArc((21.992832783, 27), (22.871512439, 29.121320344), (24.992832783, 30))
            Line((24.992832783, 30), (21.992832783, 30))
            Line((21.992832783, 30), (21.992832783, 27))
        make_face()
        with BuildLine():
            ThreePointArc((-32.5, 27), (-31.621320344, 29.121320344), (-29.5, 30))
            Line((-29.5, 30), (-32.5, 30))
            Line((-32.5, 30), (-32.5, 27))
        make_face()
        with BuildLine():
            ThreePointArc((-24.992832783, 30), (-22.871512439, 29.121320344), (-21.992832783, 27))
            Line((-21.992832783, 27), (-21.992832783, 30))
            Line((-21.992832783, 30), (-24.992832783, 30))
        make_face()
    extrude(amount=MIRROR_6_DEPTH, mode=Mode.SUBTRACT)

    # 草图6 → 切除-拉伸5 (cut, through all)
    with BuildSketch(Plane(origin=(0, 2, 0), x_dir=(1, 0, 0), z_dir=(0, 1, 0))):
        with Locations(Location((-28.367832783, -9, 0), (0, 0, 270))):
            Circle(SKETCH_6_R)
    cut_extrude_5 = extrude(amount=-CUT_EXTRUDE_5_DEPTH, mode=Mode.SUBTRACT)

    # 镜向7: 切除-拉伸5 across plane
    add(cut_extrude_5.mirror(Plane.XY), mode=Mode.SUBTRACT)

    # 草图7 → 切除-拉伸6 (cut, through all)
    with BuildSketch(Plane(origin=(0, 2, 0), x_dir=(1, 0, 0), z_dir=(0, 1, 0))):
        with BuildLine():
            Line((-11.509285997, 1.5), (-21.509285997, 1.5))
            ThreePointArc((-21.509285997, 1.5), (-23.009285997, 0), (-21.509285997, -1.5))
            Line((-21.509285997, -1.5), (-11.509285997, -1.5))
            ThreePointArc((-11.509285997, -1.5), (-10.009285997, 0), (-11.509285997, 1.5))
        make_face()
    cut_extrude_6 = extrude(amount=-CUT_EXTRUDE_6_DEPTH, mode=Mode.SUBTRACT)

    # 镜向8: 切除-拉伸5, 切除-拉伸6 across plane
    add(cut_extrude_5.mirror(Plane(origin=(0, 0, 0), x_dir=(0, 0, 1), z_dir=(1, 0, 0))), mode=Mode.SUBTRACT)
    add(cut_extrude_6.mirror(Plane(origin=(0, 0, 0), x_dir=(0, 0, 1), z_dir=(1, 0, 0))), mode=Mode.SUBTRACT)

    # 镜向8 copy 1 sketch → 镜向8 copy 1 (cut, through all)
    with BuildSketch(Plane(origin=(0, 2, 0), x_dir=(-1, 0, 0), z_dir=(0, 1, 0))):
        with Locations(Location((-28.367832783, -9, 0), (0, 0, 270))):
            Circle(MIRROR_8_COPY_1_SKETCH_R)
    extrude(amount=-MIRROR_8_COPY_1_DEPTH, mode=Mode.SUBTRACT)

    # 圆角2
    fillet_2_edges = [part.edges().sort_by_distance(p)[0] for p in [
        (11.992832783, 1, -8),
        (21.992832783, 1, -8),
        (-21.992832783, 1, -8),
        (-11.992832783, 1, -8),
        (-11.992832783, 1, 8),
        (-21.992832783, 1, 8),
        (21.992832783, 1, 8),
        (11.992832783, 1, 8),
    ]]
    fillet(fillet_2_edges, radius=FILLET_2_R)


solid = part.part
